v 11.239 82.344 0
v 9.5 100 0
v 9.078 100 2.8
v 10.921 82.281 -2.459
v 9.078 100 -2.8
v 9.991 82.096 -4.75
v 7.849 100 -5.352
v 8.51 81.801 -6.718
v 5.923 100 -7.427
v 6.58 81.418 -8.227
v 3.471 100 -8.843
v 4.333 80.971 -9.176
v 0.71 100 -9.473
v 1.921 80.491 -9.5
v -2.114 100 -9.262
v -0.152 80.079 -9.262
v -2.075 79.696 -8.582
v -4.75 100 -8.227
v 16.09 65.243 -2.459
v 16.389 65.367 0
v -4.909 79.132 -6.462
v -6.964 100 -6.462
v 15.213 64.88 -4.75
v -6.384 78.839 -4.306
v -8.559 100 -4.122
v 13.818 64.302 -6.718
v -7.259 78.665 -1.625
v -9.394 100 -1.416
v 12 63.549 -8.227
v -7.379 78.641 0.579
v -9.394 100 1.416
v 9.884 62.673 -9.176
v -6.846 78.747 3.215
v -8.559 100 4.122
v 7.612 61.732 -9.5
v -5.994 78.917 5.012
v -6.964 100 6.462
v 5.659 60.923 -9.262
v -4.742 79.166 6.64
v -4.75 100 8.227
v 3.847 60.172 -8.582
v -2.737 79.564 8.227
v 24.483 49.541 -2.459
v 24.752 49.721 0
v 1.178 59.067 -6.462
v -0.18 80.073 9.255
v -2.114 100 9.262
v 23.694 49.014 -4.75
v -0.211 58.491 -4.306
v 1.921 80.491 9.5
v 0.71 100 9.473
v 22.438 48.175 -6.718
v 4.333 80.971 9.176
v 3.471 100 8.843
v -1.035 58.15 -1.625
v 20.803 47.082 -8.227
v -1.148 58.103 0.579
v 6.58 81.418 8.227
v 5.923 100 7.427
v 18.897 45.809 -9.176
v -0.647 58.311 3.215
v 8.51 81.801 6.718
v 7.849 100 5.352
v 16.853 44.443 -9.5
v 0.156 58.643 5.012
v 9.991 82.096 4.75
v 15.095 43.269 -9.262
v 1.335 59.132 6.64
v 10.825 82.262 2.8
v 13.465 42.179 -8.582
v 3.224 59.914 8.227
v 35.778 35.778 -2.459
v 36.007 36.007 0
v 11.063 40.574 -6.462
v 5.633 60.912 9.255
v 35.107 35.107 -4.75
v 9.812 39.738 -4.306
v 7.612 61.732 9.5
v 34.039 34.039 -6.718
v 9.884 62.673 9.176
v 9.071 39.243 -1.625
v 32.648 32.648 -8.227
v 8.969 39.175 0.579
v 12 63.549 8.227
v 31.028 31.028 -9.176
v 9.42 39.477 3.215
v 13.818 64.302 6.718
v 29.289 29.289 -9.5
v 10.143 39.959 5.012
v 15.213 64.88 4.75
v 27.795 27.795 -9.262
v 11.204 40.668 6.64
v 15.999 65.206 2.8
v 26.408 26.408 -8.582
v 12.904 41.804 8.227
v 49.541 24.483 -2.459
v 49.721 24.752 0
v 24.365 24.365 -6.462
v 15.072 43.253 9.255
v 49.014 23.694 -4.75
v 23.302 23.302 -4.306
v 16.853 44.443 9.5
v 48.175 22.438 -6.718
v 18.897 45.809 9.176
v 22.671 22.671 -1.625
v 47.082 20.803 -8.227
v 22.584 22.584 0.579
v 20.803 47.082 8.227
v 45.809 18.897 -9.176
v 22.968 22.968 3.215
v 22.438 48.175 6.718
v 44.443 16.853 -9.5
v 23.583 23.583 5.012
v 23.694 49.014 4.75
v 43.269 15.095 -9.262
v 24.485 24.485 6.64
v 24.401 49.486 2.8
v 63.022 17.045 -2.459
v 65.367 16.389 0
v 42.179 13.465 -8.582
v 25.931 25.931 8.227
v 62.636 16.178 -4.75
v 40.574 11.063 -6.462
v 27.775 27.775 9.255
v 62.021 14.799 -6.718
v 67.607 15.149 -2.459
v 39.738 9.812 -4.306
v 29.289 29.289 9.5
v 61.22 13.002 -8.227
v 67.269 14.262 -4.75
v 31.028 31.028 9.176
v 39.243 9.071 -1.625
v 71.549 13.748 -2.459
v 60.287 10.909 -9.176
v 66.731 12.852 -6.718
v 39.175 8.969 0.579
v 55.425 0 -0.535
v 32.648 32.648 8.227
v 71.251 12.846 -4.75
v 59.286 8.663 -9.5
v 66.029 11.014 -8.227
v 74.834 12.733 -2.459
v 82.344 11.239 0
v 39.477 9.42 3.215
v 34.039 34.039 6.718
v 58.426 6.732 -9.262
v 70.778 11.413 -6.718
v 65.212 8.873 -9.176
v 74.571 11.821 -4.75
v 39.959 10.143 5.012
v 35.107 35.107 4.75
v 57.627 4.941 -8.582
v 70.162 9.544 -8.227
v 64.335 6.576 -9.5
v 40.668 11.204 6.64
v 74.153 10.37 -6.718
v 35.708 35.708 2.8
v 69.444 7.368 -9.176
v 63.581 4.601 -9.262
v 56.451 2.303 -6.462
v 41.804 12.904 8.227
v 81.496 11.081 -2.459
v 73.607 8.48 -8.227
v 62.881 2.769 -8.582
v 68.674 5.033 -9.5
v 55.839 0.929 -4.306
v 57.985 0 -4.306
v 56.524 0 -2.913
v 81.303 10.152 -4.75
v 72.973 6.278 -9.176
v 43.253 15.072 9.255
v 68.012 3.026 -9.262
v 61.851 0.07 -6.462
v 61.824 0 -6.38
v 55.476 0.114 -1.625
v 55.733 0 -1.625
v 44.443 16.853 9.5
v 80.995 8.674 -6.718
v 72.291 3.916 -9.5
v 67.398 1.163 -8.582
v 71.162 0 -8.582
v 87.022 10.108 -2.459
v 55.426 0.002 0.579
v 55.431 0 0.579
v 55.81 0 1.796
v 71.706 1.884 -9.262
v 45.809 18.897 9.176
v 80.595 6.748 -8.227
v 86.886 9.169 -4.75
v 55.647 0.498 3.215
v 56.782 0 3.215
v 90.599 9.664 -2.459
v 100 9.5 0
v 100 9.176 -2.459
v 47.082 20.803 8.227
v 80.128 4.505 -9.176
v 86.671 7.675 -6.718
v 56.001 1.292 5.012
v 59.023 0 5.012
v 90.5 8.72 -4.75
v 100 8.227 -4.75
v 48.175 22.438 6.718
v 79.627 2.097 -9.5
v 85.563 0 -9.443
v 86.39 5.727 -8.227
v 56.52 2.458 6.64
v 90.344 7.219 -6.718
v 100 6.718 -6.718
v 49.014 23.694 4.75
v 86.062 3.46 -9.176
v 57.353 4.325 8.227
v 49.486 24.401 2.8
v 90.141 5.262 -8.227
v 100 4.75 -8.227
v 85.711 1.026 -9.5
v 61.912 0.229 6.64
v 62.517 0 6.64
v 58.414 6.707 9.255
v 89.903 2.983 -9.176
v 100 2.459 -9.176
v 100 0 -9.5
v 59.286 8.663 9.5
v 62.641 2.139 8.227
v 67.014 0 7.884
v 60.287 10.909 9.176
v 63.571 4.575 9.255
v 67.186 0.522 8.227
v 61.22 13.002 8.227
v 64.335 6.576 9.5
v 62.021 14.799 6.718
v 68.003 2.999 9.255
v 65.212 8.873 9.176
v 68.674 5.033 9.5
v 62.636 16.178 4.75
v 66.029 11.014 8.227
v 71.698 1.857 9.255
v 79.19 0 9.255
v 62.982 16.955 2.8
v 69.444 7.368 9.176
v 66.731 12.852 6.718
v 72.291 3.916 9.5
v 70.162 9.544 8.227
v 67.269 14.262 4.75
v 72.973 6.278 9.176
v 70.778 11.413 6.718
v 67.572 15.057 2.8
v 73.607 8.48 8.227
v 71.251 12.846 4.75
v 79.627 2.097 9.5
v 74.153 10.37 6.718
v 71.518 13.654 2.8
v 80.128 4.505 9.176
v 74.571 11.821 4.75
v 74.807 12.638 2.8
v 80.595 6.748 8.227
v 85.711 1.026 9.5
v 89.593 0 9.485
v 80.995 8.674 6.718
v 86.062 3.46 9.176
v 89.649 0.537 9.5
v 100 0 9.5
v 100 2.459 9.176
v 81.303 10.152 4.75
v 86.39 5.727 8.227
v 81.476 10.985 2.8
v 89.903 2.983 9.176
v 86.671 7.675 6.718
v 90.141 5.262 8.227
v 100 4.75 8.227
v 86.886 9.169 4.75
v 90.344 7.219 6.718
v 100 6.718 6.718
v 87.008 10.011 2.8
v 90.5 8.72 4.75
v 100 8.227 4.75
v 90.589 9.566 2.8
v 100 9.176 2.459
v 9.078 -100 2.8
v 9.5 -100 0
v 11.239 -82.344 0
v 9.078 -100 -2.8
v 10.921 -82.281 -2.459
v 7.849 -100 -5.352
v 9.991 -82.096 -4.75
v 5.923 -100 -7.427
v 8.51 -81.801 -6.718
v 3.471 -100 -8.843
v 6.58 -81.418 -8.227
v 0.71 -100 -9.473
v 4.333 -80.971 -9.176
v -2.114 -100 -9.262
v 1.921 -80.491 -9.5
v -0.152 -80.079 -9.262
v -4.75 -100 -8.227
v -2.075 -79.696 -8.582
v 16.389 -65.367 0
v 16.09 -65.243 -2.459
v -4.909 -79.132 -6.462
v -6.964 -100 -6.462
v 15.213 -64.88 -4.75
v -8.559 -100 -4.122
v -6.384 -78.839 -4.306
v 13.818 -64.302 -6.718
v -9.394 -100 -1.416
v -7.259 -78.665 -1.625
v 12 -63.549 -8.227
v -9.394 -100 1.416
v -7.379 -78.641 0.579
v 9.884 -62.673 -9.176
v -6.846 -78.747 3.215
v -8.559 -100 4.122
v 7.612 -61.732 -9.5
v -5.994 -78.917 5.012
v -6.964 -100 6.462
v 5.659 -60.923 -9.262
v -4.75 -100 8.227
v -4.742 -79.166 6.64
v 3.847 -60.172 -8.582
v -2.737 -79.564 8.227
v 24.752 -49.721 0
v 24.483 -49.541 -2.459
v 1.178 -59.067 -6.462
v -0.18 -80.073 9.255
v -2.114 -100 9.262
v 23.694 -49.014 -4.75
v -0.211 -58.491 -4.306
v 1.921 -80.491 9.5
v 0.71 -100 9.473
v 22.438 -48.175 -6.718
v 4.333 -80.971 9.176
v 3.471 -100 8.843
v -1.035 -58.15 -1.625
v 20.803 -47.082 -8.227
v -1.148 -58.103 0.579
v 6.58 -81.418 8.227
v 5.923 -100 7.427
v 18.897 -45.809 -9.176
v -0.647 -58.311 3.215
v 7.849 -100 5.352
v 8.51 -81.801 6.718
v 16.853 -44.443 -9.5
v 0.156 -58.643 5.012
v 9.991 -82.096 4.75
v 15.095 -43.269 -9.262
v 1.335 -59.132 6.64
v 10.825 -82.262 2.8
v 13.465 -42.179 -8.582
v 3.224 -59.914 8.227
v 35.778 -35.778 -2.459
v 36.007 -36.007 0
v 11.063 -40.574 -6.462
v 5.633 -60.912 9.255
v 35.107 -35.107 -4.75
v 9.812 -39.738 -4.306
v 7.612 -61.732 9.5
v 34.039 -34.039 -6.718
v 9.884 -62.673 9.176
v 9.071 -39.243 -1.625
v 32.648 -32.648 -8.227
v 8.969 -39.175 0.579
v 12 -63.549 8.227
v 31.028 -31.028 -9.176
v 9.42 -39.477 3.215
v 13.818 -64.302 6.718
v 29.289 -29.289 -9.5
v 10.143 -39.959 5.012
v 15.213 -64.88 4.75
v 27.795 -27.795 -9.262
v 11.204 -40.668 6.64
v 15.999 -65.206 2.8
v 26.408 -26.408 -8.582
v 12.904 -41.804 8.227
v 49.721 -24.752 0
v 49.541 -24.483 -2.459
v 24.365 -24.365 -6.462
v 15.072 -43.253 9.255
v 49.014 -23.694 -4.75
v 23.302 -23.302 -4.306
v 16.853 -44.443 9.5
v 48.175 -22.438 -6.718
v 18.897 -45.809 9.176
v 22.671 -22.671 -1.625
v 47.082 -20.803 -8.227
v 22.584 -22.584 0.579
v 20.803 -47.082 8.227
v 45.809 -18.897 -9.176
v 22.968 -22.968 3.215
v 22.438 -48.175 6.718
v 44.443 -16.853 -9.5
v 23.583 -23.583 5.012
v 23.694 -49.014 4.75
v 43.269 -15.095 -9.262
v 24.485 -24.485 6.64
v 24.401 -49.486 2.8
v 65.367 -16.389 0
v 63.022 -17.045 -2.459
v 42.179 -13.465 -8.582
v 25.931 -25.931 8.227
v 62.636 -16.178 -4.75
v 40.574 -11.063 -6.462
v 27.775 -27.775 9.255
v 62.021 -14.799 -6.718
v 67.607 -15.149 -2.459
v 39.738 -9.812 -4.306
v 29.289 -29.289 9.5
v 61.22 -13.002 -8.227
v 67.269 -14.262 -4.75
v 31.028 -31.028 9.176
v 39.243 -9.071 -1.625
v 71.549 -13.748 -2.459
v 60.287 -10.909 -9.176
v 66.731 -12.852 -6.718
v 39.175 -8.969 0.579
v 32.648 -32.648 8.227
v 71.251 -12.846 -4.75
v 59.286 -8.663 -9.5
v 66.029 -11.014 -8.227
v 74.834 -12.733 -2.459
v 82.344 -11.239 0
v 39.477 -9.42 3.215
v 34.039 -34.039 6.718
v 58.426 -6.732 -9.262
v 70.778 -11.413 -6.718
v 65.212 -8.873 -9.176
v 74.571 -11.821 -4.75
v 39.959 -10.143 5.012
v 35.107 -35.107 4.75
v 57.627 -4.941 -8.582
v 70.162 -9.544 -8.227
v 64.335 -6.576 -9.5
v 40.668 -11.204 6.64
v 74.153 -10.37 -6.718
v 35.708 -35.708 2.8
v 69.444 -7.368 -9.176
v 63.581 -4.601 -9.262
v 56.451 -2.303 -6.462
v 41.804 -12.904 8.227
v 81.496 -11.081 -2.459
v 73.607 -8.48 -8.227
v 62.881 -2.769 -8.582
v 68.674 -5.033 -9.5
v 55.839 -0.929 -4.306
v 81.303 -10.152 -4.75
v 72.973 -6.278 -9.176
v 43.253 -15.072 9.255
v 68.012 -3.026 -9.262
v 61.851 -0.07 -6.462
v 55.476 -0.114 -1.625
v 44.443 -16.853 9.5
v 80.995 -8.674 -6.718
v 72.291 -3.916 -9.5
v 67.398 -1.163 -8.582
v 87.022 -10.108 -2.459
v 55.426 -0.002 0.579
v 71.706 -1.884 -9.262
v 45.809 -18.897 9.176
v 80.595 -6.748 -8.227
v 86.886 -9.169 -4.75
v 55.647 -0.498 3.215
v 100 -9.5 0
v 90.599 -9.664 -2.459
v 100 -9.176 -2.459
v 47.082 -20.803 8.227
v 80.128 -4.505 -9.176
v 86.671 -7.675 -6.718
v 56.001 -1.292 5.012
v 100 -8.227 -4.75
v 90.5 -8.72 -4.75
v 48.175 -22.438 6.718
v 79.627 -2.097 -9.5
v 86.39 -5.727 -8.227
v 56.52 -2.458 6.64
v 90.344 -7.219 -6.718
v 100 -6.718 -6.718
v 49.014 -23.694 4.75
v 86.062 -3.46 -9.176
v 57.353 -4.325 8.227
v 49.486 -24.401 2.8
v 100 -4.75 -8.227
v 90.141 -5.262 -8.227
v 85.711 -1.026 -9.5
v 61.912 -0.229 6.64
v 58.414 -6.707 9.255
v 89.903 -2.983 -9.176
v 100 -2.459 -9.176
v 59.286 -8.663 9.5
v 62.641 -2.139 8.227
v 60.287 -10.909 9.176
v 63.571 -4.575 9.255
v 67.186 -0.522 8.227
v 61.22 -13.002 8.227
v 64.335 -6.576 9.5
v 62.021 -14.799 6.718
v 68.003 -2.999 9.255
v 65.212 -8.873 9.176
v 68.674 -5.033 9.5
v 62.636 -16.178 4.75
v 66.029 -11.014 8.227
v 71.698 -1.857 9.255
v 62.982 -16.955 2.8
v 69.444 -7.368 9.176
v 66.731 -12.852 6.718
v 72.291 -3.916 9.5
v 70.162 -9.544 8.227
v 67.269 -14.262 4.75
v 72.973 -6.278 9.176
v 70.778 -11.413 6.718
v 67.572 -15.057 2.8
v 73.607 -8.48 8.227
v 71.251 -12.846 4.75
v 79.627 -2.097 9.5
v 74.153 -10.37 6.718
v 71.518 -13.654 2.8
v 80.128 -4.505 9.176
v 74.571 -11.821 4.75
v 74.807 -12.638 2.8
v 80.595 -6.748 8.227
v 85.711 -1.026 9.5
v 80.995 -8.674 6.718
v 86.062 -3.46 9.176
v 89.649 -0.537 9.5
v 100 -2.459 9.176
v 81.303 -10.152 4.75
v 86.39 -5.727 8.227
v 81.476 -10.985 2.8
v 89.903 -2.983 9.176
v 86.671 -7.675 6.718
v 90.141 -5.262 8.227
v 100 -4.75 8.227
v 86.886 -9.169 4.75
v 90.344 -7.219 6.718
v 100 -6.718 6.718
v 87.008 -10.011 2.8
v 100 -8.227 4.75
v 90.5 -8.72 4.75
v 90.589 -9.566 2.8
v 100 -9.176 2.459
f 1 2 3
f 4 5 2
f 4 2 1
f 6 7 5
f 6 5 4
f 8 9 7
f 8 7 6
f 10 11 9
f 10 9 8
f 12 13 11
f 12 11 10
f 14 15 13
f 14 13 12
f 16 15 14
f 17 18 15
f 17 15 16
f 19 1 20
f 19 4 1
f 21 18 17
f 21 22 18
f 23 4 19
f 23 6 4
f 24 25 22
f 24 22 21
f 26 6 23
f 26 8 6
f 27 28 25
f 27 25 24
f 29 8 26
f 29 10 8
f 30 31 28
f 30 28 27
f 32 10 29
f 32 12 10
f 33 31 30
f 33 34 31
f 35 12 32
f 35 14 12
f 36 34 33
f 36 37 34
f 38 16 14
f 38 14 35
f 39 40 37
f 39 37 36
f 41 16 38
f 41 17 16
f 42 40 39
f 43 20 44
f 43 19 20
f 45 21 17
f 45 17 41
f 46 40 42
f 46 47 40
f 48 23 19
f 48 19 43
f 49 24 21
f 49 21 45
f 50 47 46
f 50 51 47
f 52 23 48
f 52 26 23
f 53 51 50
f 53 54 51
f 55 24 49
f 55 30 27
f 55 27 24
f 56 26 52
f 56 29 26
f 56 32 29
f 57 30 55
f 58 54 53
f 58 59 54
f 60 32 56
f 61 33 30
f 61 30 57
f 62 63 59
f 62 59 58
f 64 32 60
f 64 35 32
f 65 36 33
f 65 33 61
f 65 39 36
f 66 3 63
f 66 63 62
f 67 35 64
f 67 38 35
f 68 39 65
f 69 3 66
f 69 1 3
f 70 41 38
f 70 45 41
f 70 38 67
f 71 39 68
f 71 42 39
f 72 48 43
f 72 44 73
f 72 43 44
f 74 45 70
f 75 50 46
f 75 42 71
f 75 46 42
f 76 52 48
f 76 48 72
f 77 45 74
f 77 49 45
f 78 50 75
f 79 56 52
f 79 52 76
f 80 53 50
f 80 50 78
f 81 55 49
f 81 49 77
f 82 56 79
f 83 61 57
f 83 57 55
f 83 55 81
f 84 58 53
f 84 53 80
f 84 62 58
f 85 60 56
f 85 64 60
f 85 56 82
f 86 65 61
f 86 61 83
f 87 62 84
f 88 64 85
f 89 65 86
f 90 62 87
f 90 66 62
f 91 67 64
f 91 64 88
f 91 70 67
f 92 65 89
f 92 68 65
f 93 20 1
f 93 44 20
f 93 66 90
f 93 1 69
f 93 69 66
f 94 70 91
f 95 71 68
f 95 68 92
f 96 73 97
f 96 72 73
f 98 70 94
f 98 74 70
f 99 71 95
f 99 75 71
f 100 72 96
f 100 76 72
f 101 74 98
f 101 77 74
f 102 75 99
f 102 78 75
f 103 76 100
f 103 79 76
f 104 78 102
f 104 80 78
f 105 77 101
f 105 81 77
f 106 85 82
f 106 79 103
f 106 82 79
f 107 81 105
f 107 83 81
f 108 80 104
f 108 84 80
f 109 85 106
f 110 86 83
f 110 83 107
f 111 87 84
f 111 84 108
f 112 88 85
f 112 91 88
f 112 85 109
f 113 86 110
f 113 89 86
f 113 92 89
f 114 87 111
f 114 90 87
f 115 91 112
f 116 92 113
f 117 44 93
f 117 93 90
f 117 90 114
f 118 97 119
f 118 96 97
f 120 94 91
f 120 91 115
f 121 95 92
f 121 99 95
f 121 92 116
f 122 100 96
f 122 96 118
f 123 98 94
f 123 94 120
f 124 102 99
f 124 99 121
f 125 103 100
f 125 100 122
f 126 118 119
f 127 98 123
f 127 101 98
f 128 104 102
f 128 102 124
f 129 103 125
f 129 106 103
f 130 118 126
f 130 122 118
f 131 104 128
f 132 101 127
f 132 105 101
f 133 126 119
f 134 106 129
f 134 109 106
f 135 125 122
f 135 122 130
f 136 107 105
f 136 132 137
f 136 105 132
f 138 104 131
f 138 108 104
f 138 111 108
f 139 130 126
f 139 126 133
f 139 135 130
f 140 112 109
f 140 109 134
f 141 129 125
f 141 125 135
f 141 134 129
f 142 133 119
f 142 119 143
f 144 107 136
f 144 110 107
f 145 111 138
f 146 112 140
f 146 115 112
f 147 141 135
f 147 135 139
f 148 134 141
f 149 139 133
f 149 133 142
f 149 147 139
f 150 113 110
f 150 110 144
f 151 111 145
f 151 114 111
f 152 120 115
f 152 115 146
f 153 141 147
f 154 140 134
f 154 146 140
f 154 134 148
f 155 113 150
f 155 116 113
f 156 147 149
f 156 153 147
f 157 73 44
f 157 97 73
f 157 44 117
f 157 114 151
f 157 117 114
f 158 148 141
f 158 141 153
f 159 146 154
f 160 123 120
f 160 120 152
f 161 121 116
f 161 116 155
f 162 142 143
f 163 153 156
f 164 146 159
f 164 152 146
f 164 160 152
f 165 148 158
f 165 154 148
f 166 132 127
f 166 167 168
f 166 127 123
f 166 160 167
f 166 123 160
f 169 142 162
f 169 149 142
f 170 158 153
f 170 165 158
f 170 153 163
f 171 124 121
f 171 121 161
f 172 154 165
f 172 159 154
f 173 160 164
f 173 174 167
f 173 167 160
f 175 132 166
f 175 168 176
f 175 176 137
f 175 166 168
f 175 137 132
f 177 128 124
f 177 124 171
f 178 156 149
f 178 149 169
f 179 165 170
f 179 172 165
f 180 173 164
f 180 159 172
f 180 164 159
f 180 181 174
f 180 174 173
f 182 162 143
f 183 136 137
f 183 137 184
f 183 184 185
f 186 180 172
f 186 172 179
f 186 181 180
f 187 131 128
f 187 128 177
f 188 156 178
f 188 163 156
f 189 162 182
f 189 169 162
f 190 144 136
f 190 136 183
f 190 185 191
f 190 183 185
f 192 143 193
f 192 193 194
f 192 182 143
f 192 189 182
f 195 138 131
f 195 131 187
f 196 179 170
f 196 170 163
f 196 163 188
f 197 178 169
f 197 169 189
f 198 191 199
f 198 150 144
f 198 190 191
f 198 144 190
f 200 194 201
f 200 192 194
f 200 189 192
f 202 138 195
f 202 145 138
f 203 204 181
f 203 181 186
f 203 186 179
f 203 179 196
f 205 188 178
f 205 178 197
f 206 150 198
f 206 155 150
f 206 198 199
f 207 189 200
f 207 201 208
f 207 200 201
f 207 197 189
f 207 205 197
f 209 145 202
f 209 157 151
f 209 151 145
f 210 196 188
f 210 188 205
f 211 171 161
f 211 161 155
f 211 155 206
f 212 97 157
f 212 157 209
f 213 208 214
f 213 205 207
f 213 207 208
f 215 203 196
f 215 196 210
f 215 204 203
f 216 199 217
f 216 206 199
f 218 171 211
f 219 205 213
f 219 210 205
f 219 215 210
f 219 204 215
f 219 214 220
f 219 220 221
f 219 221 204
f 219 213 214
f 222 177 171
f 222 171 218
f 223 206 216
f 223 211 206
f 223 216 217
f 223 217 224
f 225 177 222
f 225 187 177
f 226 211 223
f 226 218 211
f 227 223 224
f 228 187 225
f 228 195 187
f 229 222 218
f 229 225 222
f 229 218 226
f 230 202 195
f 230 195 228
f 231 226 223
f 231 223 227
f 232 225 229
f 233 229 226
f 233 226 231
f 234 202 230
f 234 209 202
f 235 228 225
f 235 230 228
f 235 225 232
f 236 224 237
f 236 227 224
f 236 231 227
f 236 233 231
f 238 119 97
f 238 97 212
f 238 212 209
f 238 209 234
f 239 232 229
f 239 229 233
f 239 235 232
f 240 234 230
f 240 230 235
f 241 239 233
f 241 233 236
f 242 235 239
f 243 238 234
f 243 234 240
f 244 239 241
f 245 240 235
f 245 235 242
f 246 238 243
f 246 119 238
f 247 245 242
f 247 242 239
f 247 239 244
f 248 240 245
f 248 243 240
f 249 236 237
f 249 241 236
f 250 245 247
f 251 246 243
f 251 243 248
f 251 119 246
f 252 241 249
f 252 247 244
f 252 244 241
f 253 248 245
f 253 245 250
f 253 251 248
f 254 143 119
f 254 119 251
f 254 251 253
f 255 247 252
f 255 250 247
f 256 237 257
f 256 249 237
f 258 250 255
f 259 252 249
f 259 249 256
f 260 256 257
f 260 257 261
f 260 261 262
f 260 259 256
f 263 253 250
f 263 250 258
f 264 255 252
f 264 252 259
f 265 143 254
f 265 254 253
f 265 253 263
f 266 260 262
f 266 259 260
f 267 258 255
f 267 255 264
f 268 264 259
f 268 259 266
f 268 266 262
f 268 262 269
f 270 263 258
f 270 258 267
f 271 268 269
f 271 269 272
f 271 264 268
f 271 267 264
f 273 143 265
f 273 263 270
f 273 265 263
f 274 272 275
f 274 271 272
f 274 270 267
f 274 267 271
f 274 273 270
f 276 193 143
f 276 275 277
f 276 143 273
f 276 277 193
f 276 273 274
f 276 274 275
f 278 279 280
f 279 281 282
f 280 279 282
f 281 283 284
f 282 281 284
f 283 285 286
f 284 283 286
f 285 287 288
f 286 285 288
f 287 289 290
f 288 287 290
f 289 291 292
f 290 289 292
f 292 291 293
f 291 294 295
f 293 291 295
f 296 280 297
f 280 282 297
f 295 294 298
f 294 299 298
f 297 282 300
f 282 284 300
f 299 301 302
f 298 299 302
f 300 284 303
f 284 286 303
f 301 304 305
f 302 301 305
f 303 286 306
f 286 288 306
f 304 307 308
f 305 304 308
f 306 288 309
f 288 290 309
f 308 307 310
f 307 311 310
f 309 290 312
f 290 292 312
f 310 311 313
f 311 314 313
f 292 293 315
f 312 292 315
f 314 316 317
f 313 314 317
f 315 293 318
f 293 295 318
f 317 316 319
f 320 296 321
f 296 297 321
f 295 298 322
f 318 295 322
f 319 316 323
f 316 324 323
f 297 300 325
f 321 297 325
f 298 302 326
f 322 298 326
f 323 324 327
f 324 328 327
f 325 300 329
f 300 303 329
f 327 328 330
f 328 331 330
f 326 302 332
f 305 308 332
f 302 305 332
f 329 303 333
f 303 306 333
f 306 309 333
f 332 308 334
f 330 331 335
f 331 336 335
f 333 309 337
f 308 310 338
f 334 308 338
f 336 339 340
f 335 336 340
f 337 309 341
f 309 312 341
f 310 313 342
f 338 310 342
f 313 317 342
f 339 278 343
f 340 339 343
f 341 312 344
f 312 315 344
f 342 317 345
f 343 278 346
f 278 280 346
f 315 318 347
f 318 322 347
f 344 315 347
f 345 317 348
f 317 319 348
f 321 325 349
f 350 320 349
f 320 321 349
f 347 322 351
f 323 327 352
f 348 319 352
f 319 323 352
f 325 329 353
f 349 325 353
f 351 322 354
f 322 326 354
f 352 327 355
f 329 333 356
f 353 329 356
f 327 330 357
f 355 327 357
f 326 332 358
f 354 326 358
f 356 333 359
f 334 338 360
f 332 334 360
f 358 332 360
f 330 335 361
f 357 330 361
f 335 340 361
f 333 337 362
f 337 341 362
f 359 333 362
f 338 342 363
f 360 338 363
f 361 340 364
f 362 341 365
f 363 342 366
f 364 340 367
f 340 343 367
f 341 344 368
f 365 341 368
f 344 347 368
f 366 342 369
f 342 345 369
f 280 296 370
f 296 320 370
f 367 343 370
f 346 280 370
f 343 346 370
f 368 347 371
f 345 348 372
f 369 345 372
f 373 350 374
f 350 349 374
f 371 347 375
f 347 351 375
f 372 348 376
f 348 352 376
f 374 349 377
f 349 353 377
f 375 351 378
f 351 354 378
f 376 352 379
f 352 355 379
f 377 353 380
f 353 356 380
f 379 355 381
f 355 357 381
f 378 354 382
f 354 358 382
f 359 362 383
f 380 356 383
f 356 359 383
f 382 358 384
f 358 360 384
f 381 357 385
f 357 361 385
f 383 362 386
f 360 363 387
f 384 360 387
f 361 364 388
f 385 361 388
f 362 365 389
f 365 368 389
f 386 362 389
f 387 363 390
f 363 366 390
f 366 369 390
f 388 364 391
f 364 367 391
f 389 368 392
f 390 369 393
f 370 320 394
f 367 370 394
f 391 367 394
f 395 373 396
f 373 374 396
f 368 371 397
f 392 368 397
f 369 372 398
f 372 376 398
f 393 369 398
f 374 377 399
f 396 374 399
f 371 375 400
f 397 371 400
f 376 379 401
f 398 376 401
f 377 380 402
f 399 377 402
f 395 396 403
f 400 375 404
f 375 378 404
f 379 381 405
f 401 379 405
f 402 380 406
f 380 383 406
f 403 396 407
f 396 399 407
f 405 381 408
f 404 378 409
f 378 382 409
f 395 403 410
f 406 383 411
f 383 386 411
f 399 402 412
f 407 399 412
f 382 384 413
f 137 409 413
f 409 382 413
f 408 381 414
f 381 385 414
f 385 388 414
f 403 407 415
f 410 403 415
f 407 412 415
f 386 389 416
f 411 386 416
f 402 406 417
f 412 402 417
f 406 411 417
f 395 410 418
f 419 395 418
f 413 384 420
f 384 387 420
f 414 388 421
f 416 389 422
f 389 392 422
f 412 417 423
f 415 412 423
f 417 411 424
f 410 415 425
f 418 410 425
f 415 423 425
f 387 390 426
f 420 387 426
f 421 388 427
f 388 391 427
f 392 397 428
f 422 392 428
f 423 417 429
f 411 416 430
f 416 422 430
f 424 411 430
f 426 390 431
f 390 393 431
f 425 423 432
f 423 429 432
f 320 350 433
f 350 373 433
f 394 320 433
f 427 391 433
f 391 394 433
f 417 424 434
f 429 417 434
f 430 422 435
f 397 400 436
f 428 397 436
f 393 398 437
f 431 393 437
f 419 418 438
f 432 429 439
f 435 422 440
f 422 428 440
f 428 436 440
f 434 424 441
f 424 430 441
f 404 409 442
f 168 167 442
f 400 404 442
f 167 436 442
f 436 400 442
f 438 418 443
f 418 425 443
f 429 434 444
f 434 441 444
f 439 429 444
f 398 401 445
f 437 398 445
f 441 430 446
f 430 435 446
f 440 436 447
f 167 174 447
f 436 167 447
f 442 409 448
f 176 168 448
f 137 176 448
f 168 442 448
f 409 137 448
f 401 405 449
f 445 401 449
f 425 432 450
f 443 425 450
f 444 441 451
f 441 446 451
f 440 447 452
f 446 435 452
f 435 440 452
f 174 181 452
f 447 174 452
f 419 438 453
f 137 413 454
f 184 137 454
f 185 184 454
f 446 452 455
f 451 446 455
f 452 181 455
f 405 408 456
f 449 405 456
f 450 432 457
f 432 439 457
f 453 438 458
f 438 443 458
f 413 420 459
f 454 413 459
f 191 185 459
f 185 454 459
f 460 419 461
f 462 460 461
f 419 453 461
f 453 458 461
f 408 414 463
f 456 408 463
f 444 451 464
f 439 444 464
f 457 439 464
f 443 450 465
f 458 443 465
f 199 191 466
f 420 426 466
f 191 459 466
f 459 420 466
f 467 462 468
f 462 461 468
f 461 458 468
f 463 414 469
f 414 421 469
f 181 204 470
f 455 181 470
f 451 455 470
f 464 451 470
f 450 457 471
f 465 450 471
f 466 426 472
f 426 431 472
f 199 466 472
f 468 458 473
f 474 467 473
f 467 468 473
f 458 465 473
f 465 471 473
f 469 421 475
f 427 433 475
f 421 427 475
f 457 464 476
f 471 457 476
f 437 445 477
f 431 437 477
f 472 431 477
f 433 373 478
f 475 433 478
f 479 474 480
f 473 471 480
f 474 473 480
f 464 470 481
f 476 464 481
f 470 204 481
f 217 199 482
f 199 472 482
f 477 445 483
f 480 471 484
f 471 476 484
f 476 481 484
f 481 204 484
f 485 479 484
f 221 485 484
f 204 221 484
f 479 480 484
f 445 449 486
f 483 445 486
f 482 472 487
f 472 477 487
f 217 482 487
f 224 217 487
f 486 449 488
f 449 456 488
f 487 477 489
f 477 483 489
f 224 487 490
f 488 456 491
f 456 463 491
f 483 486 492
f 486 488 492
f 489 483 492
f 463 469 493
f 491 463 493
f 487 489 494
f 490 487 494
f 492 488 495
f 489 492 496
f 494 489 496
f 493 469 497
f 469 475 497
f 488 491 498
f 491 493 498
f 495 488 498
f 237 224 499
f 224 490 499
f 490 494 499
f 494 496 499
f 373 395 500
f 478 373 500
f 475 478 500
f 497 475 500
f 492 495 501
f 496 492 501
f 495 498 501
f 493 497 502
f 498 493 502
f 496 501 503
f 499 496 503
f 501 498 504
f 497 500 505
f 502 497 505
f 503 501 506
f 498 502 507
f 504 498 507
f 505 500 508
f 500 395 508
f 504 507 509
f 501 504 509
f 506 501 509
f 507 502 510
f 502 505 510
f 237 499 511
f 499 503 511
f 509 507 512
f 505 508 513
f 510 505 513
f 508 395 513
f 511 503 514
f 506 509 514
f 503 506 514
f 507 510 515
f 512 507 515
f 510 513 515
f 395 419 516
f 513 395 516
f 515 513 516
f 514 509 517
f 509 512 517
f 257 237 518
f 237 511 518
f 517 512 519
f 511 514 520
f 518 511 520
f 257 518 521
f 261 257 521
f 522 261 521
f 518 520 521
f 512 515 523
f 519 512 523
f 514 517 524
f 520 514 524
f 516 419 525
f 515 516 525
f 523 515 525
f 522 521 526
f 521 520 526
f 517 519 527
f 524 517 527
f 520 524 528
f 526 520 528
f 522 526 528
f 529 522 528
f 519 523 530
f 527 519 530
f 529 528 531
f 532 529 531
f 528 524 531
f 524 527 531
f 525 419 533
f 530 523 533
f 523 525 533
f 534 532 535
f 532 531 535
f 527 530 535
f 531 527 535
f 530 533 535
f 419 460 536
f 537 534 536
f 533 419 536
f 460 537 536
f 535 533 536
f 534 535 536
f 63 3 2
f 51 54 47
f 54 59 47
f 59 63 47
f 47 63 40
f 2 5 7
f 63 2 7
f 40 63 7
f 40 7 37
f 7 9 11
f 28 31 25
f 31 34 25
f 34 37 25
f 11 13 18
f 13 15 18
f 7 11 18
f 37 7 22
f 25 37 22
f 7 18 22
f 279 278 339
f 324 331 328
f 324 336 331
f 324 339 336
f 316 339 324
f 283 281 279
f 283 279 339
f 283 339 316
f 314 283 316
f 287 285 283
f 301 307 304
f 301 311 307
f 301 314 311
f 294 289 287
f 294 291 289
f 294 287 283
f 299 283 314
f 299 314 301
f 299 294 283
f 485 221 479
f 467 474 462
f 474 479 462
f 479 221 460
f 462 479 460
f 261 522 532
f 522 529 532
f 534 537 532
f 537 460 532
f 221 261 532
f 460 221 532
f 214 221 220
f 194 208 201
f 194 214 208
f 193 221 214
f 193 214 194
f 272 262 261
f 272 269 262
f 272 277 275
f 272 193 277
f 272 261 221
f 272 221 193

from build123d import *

# Parameters (mm, degrees)
F2_R     = 9.5
F4_W     = 267.021797
F4_H     = 292.826072
F5_DEPTH = 40.8


with BuildPart() as f3:
    # F3: sweep along a path in F0
    with BuildLine(Plane.XY) as f3_path:
        ThreePointArc((0, 100), (29.289322, 29.289322), (100, 0))
    # F2 (on offset) → F3 (sweep)
    with BuildSketch(Plane.YZ.offset(100)):
        Circle(F2_R)
    sweep(path=f3_path.line)

    # F4 (on Front) → F5 (cut)
    with BuildSketch(Plane.XZ):
        with Locations((22.515599, 0.766836)):
            Rectangle(F4_W, F4_H)
    extrude(amount=F5_DEPTH, mode=Mode.SUBTRACT)

    # F6: F3 across face


with BuildPart() as f3_1:
    add(f3.part)
    add(f3.part.mirror(Plane(origin=(80.01217, 0, -7e-06), x_dir=(1, 0, 0), z_dir=(0, -1, 0))))


solid = f3_1.part
